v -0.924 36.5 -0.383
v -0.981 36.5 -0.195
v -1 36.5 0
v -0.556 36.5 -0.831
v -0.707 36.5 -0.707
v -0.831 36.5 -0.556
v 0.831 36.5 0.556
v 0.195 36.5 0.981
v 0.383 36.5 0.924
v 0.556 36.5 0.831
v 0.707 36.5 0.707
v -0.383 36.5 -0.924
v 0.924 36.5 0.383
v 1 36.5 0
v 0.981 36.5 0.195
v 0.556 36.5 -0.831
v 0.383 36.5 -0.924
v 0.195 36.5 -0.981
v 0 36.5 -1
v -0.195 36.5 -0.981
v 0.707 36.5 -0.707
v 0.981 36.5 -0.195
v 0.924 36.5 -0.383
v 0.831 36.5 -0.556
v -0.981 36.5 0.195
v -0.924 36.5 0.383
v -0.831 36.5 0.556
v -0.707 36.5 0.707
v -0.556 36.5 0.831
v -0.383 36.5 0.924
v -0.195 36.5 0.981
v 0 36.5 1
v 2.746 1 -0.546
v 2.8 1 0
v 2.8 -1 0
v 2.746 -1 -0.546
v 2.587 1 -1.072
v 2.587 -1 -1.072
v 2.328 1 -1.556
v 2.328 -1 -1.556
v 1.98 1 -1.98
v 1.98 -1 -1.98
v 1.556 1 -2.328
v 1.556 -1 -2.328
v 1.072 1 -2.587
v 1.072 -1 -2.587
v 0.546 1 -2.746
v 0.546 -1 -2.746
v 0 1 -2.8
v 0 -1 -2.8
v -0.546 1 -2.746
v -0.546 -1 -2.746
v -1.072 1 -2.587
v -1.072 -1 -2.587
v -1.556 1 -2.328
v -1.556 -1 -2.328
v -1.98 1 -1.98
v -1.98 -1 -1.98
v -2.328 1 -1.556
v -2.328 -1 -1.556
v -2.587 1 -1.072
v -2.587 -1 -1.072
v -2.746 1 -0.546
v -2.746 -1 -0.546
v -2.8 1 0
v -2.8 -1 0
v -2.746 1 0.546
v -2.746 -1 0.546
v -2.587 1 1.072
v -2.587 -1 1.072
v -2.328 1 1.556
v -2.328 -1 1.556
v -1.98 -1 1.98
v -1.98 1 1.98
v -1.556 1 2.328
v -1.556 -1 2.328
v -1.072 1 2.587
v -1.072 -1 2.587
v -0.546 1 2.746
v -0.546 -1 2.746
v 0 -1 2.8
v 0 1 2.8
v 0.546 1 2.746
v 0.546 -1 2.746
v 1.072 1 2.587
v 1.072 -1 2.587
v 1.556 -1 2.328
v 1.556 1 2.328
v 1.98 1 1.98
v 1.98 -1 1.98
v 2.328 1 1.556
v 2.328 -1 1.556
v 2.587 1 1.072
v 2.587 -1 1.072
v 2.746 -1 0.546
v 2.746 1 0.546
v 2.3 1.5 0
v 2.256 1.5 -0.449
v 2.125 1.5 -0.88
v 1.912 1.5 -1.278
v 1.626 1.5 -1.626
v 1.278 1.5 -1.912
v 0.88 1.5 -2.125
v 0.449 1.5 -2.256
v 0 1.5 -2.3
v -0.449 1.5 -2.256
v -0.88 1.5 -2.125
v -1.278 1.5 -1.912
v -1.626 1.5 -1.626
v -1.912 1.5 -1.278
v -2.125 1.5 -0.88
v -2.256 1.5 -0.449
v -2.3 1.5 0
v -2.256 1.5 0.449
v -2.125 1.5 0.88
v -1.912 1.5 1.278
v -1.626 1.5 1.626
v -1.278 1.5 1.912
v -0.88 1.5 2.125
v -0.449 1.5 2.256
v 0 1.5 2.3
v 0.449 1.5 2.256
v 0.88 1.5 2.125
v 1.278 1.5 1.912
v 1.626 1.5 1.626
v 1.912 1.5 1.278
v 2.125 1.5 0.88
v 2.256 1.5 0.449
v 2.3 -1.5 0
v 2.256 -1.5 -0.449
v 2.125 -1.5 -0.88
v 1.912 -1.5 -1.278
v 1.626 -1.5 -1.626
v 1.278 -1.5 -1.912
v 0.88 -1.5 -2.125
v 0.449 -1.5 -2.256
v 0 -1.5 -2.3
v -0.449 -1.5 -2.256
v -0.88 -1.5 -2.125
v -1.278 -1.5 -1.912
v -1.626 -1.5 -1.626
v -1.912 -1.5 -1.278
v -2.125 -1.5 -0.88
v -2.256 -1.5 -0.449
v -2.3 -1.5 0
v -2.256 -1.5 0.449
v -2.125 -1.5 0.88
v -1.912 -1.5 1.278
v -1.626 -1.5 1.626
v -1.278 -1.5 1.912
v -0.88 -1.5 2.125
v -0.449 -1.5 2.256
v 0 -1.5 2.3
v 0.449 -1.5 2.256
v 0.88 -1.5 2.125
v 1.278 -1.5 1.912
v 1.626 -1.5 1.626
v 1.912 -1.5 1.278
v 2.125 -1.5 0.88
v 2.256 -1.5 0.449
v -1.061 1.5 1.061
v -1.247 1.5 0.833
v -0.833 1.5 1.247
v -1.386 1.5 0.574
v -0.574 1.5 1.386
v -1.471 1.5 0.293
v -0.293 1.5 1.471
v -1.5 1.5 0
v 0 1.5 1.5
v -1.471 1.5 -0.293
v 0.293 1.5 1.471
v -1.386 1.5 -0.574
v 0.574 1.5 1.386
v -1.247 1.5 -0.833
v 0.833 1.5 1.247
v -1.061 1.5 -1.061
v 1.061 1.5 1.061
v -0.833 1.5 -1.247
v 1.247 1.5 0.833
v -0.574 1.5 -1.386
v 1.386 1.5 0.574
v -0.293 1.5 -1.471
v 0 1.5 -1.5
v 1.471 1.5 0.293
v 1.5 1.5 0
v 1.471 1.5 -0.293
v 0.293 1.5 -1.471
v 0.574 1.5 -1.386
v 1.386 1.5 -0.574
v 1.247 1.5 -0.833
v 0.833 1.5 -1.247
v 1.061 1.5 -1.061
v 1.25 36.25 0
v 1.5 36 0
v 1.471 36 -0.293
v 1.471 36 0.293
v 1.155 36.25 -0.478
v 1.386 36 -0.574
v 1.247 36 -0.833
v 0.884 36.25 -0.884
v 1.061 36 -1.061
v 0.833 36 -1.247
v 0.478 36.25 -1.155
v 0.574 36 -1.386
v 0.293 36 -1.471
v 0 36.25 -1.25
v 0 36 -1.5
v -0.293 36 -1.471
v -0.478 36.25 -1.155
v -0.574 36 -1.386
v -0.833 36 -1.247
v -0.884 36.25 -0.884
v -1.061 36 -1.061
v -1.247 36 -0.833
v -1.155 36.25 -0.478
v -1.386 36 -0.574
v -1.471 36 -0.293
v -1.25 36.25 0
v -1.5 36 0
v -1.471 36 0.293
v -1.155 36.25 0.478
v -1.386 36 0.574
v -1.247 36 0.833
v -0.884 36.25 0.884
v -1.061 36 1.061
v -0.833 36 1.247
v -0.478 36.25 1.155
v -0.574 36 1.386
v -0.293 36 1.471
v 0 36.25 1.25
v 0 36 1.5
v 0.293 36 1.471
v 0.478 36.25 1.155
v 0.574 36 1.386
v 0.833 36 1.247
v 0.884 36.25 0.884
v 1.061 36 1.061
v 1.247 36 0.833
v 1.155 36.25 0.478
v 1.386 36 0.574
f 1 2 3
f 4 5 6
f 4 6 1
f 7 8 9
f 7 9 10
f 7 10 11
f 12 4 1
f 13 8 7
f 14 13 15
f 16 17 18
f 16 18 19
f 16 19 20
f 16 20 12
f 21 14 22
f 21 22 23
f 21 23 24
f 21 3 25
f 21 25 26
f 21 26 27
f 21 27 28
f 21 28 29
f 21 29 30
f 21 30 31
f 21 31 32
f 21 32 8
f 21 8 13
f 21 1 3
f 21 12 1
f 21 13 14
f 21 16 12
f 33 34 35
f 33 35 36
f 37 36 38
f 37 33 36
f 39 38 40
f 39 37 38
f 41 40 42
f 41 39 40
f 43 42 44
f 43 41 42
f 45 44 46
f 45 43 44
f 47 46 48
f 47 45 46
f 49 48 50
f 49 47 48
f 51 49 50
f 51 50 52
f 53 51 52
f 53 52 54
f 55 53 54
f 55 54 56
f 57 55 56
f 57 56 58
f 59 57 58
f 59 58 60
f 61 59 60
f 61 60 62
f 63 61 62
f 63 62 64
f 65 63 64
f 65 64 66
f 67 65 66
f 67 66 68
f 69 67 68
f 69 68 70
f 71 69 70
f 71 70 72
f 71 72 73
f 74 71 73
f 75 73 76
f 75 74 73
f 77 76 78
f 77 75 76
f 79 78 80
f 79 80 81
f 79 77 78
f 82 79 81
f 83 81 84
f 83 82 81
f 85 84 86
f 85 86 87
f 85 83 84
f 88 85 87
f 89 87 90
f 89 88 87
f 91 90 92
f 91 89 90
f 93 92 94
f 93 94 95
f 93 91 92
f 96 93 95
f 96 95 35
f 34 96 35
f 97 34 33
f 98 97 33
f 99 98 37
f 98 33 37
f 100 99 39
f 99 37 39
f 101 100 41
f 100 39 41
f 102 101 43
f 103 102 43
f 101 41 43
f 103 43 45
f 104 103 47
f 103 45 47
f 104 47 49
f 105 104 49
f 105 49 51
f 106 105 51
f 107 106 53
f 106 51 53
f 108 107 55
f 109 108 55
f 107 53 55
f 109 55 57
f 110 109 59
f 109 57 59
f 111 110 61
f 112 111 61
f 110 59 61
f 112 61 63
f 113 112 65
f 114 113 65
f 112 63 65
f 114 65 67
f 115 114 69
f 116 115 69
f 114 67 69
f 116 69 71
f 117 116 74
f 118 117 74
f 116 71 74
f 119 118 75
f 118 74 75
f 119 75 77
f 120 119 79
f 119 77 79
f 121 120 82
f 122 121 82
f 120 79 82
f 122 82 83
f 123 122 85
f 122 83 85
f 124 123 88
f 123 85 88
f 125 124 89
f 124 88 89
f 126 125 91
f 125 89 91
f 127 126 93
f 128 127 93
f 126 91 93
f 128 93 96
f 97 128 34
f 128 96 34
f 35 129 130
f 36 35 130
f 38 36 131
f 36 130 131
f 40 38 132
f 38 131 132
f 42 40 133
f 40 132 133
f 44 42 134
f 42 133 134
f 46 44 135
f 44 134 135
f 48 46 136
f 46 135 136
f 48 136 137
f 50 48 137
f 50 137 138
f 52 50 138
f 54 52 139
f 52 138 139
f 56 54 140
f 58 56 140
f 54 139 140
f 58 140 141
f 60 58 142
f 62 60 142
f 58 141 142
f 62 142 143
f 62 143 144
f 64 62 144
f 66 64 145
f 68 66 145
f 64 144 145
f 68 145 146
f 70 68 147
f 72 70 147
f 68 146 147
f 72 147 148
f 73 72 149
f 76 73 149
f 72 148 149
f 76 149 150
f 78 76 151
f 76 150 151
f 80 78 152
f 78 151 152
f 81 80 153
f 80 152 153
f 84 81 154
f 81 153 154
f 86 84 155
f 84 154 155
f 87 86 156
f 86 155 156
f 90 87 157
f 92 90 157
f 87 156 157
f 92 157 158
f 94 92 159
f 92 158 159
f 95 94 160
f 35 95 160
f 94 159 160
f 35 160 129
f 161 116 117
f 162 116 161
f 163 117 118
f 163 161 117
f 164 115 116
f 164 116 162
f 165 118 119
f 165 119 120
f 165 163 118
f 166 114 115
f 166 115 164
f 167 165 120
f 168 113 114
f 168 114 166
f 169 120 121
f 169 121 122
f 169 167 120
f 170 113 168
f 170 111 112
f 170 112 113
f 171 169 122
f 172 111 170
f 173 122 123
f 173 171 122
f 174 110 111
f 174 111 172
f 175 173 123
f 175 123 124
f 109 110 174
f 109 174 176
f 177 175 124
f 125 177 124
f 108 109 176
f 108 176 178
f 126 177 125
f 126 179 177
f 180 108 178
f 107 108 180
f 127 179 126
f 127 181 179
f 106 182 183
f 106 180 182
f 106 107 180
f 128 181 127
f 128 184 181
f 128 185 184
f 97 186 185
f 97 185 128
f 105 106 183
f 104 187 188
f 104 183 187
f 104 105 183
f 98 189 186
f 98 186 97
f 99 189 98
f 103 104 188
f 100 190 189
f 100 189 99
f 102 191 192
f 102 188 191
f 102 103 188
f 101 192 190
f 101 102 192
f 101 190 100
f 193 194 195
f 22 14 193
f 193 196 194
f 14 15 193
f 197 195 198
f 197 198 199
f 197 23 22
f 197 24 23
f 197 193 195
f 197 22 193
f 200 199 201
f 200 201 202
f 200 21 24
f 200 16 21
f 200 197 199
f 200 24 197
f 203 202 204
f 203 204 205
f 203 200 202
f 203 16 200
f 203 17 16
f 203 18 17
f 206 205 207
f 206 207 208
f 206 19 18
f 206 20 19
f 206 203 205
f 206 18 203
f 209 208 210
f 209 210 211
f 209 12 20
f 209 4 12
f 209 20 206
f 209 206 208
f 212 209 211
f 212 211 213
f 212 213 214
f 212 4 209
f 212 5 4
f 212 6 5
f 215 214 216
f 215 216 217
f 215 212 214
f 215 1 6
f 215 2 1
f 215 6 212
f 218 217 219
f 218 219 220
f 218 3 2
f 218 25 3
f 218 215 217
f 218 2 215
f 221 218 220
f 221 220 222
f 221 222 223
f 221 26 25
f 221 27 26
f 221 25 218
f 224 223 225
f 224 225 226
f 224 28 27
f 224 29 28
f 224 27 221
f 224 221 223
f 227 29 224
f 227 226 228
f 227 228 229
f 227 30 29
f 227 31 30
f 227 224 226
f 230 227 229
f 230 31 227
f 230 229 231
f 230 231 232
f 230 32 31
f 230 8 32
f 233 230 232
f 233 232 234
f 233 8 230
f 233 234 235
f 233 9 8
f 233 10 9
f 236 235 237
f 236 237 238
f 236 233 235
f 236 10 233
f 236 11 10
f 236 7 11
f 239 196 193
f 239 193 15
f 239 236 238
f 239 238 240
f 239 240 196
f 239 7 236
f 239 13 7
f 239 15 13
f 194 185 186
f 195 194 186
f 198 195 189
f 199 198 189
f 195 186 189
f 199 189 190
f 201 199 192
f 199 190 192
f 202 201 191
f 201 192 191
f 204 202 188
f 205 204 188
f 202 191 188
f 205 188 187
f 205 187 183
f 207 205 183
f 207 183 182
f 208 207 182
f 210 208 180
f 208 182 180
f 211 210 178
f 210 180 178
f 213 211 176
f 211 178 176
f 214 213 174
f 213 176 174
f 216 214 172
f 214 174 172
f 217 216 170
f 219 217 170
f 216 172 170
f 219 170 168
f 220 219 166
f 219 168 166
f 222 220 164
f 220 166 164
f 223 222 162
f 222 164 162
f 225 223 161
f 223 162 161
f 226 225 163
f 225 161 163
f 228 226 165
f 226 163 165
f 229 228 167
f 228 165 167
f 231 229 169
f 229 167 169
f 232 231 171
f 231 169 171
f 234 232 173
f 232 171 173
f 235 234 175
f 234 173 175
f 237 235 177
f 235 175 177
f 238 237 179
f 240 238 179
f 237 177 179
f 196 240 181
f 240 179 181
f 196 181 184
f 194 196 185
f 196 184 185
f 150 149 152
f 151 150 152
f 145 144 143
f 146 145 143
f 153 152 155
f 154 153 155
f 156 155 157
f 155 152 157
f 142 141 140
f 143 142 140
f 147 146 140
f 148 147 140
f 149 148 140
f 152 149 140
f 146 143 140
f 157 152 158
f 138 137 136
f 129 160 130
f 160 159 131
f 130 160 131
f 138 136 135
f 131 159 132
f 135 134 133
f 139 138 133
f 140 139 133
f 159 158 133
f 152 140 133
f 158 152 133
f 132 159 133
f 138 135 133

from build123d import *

# Parameters (mm, degrees)
SKETCH1_R           = 2.8
BOSS_EXTRUDE1_DEPTH = 1.5
SKETCH2_R           = 1.5
BOSS_EXTRUDE2_DEPTH = 35
CHAMFER1_SIZE       = 0.5
CHAMFER2_SIZE       = 0.5


with BuildPart() as part:
    # Sketch1 → Boss-Extrude1 (new body, symmetric)
    with BuildSketch(Plane(origin=(0, 0, 0), x_dir=(1, 0, 0), z_dir=(0, 1, 0))):
        Circle(SKETCH1_R)
    extrude(amount=BOSS_EXTRUDE1_DEPTH, both=True)

    # Sketch2 → Boss-Extrude2 (add)
    with BuildSketch(Plane(origin=(0, 1.5, 0), x_dir=(1, 0, 0), z_dir=(0, 1, 0))):
        Circle(SKETCH2_R)
    extrude(amount=BOSS_EXTRUDE2_DEPTH)

    # Chamfer1
    chamfer1_edges = [part.edges().sort_by_distance(p)[0] for p in [
        (-1.5, 36.5, 0),
    ]]
    chamfer(chamfer1_edges, length=CHAMFER1_SIZE)

    # Chamfer2
    chamfer2_edges = [part.edges().sort_by_distance(p)[0] for p in [
        (-2.8, -1.5, 0),
        (-2.8, 1.5, 0),
    ]]
    chamfer(chamfer2_edges, length=CHAMFER2_SIZE)


solid = part.part
